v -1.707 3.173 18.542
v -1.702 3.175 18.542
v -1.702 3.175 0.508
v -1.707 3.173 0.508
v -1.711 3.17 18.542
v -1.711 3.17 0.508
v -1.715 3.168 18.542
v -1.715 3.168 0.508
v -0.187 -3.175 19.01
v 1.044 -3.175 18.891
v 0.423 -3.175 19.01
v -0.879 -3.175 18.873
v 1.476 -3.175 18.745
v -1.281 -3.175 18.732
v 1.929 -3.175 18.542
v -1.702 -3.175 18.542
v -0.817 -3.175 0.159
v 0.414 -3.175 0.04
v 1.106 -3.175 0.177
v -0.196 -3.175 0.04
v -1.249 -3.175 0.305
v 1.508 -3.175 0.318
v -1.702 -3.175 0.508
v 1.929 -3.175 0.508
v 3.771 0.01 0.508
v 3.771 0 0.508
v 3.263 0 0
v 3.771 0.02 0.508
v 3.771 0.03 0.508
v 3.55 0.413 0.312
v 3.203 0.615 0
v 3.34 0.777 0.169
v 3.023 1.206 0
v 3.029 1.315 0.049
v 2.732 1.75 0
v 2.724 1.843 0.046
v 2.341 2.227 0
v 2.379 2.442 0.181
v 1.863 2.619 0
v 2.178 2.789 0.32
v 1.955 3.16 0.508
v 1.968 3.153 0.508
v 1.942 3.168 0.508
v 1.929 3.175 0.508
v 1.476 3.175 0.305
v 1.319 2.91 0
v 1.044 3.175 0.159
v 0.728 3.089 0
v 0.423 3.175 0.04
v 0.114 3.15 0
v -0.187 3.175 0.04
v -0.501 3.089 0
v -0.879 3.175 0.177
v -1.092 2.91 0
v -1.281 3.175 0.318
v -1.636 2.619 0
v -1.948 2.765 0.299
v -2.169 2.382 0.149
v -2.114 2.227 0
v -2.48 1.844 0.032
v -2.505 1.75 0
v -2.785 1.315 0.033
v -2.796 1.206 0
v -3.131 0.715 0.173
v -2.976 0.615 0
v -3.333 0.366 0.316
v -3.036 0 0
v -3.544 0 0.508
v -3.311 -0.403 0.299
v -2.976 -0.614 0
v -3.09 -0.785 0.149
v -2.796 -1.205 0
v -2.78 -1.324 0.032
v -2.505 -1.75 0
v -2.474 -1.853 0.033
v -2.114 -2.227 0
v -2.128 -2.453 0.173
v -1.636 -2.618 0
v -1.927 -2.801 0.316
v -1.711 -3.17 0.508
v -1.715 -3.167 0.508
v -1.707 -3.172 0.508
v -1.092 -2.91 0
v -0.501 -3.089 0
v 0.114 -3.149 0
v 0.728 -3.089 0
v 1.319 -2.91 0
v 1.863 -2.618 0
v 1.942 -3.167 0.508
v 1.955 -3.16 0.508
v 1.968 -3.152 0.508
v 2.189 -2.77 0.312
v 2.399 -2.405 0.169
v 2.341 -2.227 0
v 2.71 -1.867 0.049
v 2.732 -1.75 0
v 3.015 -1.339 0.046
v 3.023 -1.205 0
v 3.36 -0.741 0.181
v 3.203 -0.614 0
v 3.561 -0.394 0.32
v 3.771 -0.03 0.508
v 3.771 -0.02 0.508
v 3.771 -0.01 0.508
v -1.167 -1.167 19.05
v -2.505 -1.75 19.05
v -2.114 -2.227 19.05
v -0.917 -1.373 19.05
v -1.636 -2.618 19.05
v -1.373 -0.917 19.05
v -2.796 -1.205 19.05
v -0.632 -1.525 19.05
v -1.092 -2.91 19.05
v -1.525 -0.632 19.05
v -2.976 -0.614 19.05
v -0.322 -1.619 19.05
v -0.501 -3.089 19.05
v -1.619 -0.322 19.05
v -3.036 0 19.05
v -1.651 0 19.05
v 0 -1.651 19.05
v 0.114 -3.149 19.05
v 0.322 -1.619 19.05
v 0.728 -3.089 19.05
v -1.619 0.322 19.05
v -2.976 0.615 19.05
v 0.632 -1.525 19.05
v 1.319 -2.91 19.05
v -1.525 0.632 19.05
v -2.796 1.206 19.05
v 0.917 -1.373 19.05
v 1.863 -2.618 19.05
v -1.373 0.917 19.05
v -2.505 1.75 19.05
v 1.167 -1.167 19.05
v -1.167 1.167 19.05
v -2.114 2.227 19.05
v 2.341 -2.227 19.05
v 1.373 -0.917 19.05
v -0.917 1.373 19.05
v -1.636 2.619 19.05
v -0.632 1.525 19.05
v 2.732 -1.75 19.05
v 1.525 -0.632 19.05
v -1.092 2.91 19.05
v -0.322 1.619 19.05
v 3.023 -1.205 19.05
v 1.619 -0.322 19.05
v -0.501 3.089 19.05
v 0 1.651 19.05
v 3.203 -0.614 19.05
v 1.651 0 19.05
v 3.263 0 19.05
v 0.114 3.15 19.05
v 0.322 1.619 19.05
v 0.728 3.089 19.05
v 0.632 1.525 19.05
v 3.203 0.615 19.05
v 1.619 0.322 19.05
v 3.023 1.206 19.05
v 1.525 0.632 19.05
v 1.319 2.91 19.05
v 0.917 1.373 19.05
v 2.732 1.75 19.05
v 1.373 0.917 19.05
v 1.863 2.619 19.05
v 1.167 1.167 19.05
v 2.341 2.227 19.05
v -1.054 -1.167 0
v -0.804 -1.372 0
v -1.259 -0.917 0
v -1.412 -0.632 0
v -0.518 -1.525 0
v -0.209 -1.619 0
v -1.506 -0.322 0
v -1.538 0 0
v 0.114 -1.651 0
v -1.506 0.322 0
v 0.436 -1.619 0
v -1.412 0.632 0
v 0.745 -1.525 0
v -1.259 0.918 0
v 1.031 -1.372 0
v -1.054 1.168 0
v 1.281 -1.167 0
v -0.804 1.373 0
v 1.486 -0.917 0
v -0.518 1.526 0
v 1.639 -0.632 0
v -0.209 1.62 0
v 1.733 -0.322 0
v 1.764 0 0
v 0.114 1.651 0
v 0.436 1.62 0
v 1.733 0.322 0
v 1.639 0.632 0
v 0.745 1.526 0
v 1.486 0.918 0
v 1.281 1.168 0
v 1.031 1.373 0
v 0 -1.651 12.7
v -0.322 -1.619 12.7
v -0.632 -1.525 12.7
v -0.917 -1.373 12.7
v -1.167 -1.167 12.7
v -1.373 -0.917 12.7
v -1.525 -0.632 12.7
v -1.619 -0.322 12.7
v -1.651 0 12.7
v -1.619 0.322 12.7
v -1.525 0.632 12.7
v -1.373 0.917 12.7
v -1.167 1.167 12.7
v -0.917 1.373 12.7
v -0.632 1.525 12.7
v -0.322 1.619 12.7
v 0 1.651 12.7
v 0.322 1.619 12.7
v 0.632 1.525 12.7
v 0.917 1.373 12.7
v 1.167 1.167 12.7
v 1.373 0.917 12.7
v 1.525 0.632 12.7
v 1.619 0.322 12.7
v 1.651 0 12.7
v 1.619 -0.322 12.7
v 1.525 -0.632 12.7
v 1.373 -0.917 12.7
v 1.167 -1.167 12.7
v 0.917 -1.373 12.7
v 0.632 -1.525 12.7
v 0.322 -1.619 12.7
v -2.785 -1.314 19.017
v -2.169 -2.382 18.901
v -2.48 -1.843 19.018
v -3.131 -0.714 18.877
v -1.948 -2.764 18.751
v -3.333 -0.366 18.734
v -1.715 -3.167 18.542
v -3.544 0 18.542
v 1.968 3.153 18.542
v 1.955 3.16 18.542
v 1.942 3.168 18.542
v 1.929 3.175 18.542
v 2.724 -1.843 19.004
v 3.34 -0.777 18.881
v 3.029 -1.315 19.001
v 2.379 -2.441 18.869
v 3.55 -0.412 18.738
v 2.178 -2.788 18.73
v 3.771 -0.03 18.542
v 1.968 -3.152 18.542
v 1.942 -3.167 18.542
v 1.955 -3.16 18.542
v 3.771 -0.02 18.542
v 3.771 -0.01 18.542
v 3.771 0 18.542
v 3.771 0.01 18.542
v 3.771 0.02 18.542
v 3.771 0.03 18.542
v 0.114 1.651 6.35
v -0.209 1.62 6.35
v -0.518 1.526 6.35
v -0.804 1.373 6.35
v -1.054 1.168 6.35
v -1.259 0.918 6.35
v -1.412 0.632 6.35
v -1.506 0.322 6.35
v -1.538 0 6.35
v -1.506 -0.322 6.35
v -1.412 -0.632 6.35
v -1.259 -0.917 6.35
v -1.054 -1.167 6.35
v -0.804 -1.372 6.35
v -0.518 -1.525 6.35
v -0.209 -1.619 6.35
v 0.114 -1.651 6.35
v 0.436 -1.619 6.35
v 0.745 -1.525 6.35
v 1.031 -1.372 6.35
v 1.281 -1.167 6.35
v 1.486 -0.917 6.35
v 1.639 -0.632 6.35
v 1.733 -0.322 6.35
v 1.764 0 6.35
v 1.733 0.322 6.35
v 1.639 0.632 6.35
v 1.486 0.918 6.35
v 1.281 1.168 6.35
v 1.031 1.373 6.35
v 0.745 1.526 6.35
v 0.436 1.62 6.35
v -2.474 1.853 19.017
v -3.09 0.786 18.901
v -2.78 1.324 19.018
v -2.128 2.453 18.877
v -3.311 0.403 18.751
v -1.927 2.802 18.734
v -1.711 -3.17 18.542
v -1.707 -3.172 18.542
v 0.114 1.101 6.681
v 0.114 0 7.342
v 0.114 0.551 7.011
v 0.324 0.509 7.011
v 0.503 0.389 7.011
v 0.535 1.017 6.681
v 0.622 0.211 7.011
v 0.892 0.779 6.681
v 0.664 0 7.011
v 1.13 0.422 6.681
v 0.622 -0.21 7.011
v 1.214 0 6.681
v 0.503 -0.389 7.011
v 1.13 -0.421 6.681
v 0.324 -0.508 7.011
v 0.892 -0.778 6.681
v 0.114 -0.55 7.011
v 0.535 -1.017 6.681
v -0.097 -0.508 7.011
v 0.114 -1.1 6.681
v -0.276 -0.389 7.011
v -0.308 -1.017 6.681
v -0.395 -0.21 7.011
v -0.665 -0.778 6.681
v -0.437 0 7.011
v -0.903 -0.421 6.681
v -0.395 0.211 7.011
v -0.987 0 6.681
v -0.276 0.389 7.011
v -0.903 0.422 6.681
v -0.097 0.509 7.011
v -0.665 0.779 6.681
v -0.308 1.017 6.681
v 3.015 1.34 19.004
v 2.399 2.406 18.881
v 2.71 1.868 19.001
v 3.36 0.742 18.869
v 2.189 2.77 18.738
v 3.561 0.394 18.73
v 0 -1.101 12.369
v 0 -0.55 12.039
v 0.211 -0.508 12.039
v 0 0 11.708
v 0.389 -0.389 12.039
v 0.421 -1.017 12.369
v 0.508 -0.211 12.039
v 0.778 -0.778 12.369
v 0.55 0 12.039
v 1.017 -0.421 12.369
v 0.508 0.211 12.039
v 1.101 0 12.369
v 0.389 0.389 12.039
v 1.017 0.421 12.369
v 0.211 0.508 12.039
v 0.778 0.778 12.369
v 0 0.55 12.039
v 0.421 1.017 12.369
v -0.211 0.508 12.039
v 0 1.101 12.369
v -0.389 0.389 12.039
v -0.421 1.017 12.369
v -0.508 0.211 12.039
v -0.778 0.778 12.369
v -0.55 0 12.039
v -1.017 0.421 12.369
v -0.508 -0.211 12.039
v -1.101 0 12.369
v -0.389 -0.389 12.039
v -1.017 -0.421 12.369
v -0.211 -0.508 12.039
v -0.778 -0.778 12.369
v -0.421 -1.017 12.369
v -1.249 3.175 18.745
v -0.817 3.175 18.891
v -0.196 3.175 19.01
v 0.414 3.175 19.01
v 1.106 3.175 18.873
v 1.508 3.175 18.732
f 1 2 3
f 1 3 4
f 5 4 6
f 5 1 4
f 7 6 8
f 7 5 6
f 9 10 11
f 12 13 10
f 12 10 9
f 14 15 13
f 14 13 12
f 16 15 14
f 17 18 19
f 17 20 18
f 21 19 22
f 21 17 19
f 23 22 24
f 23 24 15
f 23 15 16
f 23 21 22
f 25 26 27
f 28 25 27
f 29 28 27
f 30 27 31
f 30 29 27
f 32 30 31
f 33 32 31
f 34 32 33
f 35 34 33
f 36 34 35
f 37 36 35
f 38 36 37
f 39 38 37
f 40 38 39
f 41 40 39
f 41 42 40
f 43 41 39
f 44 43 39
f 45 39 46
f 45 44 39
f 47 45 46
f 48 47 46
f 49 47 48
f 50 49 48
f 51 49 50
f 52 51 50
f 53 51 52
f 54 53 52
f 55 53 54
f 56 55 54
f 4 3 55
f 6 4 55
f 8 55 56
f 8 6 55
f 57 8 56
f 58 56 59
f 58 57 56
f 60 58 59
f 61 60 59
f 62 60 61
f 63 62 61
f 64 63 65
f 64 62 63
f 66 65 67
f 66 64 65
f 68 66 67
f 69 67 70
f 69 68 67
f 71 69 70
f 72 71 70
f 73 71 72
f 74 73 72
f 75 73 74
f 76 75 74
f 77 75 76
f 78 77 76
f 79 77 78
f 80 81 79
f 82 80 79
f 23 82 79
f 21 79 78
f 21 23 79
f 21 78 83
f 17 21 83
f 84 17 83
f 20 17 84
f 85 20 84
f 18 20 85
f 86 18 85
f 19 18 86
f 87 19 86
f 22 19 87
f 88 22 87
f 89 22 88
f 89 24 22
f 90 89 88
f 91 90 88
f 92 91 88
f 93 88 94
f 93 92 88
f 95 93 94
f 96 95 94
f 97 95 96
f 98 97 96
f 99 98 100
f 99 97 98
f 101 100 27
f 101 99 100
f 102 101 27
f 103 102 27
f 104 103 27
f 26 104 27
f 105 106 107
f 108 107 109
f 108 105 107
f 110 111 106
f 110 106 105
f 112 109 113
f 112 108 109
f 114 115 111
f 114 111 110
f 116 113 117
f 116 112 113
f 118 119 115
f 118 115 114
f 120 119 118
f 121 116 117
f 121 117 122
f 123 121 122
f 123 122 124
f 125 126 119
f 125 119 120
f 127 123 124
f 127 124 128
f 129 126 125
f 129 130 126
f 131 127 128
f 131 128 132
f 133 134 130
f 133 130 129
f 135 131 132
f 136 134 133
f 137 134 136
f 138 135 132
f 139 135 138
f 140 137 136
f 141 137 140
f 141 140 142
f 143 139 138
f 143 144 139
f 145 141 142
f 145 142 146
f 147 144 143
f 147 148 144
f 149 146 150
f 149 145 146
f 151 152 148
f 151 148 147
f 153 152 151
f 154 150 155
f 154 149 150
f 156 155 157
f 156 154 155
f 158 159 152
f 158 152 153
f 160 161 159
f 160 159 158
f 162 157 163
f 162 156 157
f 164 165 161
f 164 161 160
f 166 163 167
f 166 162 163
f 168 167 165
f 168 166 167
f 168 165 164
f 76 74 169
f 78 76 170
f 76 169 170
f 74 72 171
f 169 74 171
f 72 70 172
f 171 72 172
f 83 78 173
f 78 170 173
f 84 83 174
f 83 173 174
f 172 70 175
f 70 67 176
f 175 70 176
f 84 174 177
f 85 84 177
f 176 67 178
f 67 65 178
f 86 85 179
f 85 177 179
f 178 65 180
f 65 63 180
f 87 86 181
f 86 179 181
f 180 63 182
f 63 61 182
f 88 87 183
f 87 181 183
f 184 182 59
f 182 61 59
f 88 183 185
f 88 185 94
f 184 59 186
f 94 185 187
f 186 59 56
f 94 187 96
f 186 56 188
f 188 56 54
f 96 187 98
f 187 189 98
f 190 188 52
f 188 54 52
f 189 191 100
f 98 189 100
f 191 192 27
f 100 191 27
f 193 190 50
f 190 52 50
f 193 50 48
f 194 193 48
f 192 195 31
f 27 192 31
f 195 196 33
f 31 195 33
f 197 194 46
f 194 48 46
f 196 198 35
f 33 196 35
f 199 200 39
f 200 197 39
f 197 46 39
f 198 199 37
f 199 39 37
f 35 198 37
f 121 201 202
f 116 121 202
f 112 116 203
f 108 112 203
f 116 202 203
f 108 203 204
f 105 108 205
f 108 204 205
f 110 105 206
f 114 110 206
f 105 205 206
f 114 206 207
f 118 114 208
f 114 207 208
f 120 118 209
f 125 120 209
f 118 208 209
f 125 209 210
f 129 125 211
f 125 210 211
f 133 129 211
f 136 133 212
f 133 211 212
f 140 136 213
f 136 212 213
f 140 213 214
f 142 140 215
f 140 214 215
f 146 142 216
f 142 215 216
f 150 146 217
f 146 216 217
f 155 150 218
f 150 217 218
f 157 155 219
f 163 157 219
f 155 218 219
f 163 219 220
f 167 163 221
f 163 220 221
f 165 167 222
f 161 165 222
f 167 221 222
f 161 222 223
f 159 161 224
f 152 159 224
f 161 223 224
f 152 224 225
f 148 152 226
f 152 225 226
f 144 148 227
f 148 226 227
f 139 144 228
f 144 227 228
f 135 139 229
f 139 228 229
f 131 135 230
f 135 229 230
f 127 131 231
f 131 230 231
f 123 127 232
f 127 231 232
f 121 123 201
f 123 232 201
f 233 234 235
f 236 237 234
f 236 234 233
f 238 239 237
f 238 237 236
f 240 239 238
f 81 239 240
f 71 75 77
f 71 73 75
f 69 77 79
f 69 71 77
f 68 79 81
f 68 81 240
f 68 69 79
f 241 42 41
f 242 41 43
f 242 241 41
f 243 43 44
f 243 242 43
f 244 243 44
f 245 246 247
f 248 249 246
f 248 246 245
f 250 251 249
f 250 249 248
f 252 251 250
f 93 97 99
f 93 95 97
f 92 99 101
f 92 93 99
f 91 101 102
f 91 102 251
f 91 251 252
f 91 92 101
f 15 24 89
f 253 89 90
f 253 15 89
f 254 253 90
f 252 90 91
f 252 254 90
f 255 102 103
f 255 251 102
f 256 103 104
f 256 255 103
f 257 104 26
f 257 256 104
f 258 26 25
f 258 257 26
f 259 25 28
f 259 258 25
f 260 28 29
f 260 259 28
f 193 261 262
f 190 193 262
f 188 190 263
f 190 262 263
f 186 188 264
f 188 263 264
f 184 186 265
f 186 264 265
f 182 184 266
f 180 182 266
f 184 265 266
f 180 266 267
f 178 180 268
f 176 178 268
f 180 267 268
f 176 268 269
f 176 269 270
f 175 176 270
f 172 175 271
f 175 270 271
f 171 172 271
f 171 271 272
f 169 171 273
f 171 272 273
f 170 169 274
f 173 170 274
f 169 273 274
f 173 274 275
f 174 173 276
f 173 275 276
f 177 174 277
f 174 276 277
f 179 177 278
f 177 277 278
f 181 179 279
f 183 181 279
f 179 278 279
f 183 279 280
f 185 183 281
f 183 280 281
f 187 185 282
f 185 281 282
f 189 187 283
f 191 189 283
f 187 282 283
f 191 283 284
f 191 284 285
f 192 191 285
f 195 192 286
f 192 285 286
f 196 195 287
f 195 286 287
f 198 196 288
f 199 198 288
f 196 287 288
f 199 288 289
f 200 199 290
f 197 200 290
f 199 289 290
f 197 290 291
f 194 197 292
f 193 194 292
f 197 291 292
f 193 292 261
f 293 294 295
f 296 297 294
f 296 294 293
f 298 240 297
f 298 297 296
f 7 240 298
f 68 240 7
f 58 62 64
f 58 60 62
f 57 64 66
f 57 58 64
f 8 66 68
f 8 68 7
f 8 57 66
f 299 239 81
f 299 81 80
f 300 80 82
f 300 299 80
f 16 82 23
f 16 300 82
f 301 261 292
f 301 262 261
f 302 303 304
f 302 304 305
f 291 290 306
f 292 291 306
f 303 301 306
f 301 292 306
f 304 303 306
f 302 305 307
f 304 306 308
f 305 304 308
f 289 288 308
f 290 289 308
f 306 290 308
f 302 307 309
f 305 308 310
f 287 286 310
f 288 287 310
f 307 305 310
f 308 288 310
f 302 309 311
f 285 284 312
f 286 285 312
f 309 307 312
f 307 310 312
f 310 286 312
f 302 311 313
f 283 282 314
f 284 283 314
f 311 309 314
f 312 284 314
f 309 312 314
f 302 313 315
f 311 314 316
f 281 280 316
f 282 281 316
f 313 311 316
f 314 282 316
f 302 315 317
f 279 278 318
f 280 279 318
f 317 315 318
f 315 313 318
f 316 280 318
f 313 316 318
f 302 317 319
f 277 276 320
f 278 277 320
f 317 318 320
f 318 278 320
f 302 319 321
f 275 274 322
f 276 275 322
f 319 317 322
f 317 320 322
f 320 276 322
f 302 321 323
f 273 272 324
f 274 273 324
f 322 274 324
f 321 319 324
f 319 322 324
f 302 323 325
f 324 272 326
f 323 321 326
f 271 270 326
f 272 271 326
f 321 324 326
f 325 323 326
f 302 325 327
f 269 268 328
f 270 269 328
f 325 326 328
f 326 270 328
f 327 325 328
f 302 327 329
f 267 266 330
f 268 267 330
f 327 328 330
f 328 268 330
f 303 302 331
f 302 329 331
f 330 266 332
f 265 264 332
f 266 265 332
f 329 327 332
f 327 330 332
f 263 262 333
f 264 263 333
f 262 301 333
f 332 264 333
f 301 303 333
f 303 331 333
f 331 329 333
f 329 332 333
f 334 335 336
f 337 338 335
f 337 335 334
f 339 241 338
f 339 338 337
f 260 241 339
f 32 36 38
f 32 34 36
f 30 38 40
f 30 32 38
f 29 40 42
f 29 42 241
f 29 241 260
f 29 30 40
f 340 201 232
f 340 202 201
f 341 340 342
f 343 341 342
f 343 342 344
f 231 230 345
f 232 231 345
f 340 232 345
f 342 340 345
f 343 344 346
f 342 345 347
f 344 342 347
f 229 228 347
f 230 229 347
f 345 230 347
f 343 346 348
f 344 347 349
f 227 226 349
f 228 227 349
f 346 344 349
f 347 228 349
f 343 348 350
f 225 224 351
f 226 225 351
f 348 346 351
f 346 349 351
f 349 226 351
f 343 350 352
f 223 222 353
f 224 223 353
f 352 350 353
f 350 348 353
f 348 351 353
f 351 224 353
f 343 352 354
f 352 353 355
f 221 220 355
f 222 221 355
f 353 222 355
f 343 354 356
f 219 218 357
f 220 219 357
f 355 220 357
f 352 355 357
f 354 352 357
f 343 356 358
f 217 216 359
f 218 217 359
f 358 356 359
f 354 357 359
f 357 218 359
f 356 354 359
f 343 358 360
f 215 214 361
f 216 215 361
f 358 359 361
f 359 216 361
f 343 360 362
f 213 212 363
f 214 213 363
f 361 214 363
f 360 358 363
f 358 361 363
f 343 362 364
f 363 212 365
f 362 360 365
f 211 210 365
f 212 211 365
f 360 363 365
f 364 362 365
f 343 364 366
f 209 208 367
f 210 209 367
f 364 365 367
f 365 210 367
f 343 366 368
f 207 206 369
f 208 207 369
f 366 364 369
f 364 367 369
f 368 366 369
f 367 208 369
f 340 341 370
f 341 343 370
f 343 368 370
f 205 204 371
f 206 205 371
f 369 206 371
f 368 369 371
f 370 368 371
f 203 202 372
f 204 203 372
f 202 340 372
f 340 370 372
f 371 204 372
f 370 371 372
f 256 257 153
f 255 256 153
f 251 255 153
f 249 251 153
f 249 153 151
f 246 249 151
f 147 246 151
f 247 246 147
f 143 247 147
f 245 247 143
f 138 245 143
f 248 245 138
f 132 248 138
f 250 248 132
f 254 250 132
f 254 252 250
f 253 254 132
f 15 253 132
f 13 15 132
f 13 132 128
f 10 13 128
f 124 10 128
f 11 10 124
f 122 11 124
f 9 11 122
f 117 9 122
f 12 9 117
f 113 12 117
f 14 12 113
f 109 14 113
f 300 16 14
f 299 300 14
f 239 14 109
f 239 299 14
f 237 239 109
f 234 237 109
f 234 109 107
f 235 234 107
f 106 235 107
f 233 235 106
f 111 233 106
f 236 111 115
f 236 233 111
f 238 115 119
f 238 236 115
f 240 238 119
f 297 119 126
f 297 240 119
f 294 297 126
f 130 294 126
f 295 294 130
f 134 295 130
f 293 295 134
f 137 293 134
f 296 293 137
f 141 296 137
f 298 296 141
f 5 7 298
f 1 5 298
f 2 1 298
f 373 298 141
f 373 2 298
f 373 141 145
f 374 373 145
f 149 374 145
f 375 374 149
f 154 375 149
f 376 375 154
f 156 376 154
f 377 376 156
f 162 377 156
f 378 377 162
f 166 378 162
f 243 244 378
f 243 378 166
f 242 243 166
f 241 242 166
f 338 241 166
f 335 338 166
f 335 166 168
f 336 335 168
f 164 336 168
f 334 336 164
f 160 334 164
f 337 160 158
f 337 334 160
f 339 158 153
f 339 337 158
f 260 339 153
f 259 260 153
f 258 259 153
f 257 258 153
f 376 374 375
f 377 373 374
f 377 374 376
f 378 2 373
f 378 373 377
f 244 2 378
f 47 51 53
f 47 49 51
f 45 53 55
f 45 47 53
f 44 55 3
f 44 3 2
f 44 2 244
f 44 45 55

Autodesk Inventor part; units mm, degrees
ref_plane "YZ Plane" through (0, 0, 0) normal (1, 0, 0) x (0, 1, 0)
sketch "Sketch1" plane through (0, 0, 0) normal (0, 0, 1) x (1, 0, 0)
  line L0 (1.9552, -3.1747) -> (-1.711, -3.1747)
  line L1 (-1.711, -3.1747) -> (-3.5441, 0.0003)
  line L2 (-3.5441, 0.0003) -> (-1.711, 3.1753)
  line L3 (-1.711, 3.1753) -> (1.9552, 3.1753)
  line L4 (1.9552, 3.1753) -> (3.7883, 0.0003)
  line L5 (3.7883, 0.0003) -> (1.9552, -3.1747)
  point P0 (0.1221, 0.0003)
  dimension "d0" = 6.35
extrude "Extrusion1" add sketch "Sketch1" along normal blind 19.05
ref_plane "Work Plane1" through (-1.711, 0.0003, 0) normal (0, 1, 0) x (1, 0, 0)
sketch "Sketch3" plane through (-1.711, 0.0003, 0) normal (0, 1, 0) x (1, 0, 0)
  line L0 (-1.3251, 0) -> (4.9741, 0)
  line L1 (5.4821, -0.508) -> (5.4821, -18.542)
  line L2 (-1.8331, -18.542) -> (-1.8331, -0.508)
  line L3 (-1.8331, -0.508) -> (-1.3251, 0)
  line L4 (4.9741, 0) -> (5.4821, -0.508)
  line L5 (-1.8331, 0) -> (-1.8331, -19.05) projected
  line L6 (3.6662, 0) -> (5.4993, 0) projected
  line L7 (1.8245, 0) -> (1.8245, -19.05)
  line L8 (0, -19.05) -> (-1.8331, -19.05) projected
  line L9 (5.4993, -19.05) -> (3.6662, -19.05) projected
  line L10 (3.6662, -19.05) -> (0, -19.05) projected
  line L11 (-1.3251, -19.05) -> (-1.8331, -18.542)
  line L12 (4.9741, -19.05) -> (5.4821, -18.542)
  point P0 (-1.8331, 0)
  point P1 (5.4821, 0)
  point P2 (5.4821, -19.05)
  dimension "d5" = 0.508
  dimension "d6" = 0.508
  dimension "d7" = 0.508
  dimension "d8" = 0.508
  dimension "d16" = 0
  dimension "d46" = 0.508
  dimension "d47" = 0.508
  dimension "d48" = 0.508
  dimension "d49" = 0.508
revolve "Revolution1" cut sketch "Sketch3" angle 360 about axis through (0.1135, 0.0003, 0) along (0, 0, 1) keep common part contours L0 L4 L1 L12 L9 L10 L7
sketch "Sketch6" plane through (0.1135, 0.0003, 0) normal (0, 0, -1) x (-1, 0, 0)
  circle A0 centre (0, 0) radius 3.1496 projected
hole "Hole3" at (0.1135, 0.0003, 0) direction (0, 0, 1) diameter 3.302 depth 6.35 tip angle 118 thread size "8-32 UNC" class "2B" standard "ANSI Unified Screw Threads"
sketch "Sketch7" plane through (0, 0, 19.05) normal (0, 0, 1) x (1, 0, 0)
  point P0 (0, 0)
hole "Hole4" at (0, 0, 19.05) direction (0, 0, -1) diameter 3.302 depth 6.35 tip angle 118 thread size "8-32 UNC" class "2B" standard "ANSI Unified Screw Threads"
ref_plane "Work Plane2" through (0.1135, 0.0003, 9.525) normal (0, 0, -1) x (-1, 0, 0)
equation "\"d6\" = d5"
equation "\"d7\" = d5"
equation "\"d8\" = d7"
properties part number "0.75 inch Standoff" material "Steel"
